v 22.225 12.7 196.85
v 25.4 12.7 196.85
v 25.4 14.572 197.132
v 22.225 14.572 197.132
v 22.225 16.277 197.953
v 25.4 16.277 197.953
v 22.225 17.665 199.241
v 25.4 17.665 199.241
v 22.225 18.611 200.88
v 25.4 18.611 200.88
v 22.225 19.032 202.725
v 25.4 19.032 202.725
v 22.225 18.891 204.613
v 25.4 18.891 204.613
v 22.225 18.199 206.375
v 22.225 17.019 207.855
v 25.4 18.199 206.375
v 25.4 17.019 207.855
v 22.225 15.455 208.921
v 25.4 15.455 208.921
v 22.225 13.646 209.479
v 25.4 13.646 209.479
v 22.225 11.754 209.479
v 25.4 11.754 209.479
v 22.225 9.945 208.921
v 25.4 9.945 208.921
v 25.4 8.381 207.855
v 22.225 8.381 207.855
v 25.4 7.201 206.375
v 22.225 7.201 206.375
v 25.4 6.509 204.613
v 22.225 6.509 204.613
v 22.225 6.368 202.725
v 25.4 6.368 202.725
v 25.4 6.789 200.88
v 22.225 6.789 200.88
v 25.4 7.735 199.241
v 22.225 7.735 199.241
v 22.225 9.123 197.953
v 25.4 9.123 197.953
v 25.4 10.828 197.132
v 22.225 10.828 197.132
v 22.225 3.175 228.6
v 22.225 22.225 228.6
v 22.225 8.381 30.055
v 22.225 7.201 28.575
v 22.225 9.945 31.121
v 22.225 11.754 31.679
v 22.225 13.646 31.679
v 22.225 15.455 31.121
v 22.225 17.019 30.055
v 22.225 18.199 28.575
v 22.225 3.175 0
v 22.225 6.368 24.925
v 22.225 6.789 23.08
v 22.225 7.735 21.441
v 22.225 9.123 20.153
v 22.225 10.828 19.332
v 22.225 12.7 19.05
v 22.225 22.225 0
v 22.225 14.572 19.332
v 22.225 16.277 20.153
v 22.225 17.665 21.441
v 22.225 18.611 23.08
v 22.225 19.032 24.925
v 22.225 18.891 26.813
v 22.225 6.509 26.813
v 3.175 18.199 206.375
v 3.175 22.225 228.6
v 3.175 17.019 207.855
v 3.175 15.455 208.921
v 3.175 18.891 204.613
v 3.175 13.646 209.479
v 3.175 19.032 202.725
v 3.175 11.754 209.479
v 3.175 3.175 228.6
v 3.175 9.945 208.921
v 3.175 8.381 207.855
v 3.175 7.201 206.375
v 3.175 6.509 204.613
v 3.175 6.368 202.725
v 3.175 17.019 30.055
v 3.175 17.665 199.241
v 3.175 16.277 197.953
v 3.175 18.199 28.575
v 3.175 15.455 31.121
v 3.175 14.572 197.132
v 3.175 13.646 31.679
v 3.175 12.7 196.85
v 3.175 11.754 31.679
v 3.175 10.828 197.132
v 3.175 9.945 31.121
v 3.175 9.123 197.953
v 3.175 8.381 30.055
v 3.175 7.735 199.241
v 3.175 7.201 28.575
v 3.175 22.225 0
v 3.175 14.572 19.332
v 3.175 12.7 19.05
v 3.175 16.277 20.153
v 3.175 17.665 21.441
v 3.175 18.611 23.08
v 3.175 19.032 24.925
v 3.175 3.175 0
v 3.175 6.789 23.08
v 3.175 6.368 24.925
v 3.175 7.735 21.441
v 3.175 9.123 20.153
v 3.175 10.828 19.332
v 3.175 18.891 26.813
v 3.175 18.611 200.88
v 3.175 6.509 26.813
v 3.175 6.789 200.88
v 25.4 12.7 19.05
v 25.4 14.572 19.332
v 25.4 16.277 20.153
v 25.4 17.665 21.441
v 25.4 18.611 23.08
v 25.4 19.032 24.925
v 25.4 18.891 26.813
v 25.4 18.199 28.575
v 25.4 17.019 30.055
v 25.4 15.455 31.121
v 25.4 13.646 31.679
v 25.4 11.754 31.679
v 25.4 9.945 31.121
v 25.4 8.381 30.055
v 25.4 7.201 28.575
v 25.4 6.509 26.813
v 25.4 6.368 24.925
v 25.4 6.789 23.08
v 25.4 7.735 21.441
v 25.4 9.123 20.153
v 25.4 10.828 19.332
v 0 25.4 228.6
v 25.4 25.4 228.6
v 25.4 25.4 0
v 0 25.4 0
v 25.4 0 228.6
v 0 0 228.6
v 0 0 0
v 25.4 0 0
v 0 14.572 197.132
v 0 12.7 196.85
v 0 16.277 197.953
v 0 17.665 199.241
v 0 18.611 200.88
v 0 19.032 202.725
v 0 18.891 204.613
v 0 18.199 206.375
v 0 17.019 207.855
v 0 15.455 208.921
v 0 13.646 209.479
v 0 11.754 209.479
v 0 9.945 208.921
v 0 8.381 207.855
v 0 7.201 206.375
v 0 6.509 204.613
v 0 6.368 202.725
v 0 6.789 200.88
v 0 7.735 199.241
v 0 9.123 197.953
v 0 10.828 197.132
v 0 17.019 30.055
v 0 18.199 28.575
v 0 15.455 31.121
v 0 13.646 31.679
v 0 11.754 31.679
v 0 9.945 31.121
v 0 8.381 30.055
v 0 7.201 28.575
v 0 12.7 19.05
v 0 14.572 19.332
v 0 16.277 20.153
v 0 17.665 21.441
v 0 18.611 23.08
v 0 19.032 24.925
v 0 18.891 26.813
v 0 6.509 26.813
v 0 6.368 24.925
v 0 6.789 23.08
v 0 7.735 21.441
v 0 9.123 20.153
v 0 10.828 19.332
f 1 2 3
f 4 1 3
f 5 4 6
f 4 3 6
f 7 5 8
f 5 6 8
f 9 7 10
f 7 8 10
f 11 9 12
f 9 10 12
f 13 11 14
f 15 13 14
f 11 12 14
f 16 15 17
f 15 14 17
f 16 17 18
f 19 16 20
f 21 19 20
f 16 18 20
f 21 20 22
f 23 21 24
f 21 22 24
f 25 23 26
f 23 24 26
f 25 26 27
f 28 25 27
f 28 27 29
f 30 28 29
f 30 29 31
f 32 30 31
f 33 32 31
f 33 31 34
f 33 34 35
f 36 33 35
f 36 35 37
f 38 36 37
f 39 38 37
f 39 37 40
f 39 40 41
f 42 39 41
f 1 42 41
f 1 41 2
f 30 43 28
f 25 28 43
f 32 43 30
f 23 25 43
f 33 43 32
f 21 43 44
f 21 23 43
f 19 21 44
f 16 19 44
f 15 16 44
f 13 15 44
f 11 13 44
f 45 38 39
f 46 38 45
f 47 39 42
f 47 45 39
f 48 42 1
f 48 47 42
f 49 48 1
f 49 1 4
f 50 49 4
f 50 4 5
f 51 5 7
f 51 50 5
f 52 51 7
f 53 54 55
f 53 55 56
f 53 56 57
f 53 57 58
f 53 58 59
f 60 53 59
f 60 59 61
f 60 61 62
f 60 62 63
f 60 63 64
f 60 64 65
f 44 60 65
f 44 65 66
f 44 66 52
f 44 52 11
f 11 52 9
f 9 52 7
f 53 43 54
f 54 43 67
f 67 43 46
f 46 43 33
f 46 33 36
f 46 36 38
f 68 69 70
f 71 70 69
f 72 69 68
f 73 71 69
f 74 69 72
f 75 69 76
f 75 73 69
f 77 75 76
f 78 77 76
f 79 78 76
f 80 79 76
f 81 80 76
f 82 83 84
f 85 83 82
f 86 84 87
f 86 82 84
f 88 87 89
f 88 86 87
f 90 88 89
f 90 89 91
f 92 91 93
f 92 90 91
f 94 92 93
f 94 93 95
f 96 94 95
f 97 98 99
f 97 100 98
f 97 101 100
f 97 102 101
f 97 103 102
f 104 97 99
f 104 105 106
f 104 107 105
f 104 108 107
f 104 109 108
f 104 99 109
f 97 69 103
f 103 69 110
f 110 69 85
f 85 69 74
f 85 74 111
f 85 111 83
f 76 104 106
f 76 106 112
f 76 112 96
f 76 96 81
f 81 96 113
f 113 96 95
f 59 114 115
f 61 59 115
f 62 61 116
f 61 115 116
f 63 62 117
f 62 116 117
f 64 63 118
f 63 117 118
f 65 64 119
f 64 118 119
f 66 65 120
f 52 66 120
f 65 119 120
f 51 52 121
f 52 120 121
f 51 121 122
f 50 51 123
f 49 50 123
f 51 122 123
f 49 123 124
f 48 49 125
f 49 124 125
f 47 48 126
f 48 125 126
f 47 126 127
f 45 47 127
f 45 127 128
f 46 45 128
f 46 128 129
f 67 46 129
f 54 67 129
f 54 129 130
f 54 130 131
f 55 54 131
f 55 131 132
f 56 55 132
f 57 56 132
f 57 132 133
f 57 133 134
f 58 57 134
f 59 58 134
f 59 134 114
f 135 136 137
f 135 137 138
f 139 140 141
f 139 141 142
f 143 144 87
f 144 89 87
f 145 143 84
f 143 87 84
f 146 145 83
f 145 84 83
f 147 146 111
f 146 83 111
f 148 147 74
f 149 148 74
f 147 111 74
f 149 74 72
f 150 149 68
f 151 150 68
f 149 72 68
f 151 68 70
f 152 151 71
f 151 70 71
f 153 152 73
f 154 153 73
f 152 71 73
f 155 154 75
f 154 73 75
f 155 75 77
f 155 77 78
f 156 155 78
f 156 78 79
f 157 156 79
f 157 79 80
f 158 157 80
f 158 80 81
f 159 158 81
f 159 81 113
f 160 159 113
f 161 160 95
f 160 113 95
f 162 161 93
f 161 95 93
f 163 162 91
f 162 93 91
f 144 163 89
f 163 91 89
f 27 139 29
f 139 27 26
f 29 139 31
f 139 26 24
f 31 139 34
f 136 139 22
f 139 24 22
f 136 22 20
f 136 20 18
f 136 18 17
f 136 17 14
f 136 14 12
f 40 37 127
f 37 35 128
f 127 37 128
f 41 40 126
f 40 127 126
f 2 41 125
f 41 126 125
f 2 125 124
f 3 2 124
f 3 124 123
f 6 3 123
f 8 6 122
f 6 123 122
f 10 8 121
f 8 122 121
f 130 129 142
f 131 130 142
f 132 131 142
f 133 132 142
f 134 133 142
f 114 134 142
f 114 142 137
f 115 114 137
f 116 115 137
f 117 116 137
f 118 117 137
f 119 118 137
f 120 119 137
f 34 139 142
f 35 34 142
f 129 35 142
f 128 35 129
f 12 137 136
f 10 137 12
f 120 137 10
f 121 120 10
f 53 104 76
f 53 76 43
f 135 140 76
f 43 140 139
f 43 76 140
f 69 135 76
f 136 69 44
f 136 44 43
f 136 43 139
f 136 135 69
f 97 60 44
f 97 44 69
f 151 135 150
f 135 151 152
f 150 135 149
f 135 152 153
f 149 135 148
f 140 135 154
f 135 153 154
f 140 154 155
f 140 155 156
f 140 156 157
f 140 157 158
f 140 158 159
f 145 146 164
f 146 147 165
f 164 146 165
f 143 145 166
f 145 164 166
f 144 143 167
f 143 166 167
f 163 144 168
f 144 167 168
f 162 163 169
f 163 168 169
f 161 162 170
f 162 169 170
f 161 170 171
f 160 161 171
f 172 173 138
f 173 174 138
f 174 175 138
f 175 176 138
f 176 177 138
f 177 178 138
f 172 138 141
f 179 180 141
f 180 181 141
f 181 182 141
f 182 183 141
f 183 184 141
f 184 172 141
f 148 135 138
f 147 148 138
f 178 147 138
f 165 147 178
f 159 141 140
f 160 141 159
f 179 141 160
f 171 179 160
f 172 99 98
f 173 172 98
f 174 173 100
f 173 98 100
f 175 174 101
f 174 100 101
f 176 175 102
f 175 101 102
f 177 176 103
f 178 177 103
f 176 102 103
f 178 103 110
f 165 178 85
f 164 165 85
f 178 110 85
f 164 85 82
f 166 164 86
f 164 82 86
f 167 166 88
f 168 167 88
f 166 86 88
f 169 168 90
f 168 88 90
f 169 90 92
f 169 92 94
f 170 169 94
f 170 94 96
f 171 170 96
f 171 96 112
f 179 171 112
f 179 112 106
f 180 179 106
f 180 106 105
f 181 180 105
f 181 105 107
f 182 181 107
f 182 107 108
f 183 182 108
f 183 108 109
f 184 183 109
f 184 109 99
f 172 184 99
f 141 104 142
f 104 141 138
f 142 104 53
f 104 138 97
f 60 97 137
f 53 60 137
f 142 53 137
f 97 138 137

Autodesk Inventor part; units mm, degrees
ref_plane "YZ Plane" through (0, 0, 0) normal (1, 0, 0) x (0, 1, 0)
ref_plane "XZ Plane" through (0, 0, 0) normal (0, 1, 0) x (-1, 0, 0)
ref_plane "XY Plane" through (0, 0, 0) normal (0, 0, 1) x (1, 0, 0)
sketch "Sketch1" plane through (0, 0, 0) normal (0, 0, 1) x (1, 0, 0)
  line L0 (0, 0) -> (25.4, 0)
  line L1 (25.4, 0) -> (25.4, 25.4)
  line L2 (25.4, 25.4) -> (0, 25.4)
  line L3 (0, 25.4) -> (0, 0)
  dimension "d0" = 25.4
  dimension "d1" = 25.4
extrude "Extrusion1" add sketch "Sketch1" along normal blind 228.6
shell "Shell1" thickness 3.175 removed faces 2 at (8.4667, 16.9333, 0) at (8.4667, 16.9333, 228.6)
sketch "Sketch2" plane through (25.4, 0, 0) normal (1, 0, 0) x (0, 0, -1)
  circle A0 centre (-25.4, 12.7) radius 6.35
  line L0 (0, 25.4) -> (-228.6, 25.4) projected
  line L1 (0, 0) -> (0, 25.4) projected
  circle A1 centre (-203.2, 12.7) radius 6.35
  line L2 (-228.6, 0) -> (-228.6, 25.4) projected
  dimension "d5" = 12.7
  dimension "d6" = 12.7
  dimension "d7" = 25.4
  dimension "d10" = 12.7
  dimension "d11" = 12.7
  dimension "d12" = 25.4
extrude "Extrusion2" cut sketch "Sketch2" against normal blind 228.6
properties part number "Kermit Arm_Connecter"
